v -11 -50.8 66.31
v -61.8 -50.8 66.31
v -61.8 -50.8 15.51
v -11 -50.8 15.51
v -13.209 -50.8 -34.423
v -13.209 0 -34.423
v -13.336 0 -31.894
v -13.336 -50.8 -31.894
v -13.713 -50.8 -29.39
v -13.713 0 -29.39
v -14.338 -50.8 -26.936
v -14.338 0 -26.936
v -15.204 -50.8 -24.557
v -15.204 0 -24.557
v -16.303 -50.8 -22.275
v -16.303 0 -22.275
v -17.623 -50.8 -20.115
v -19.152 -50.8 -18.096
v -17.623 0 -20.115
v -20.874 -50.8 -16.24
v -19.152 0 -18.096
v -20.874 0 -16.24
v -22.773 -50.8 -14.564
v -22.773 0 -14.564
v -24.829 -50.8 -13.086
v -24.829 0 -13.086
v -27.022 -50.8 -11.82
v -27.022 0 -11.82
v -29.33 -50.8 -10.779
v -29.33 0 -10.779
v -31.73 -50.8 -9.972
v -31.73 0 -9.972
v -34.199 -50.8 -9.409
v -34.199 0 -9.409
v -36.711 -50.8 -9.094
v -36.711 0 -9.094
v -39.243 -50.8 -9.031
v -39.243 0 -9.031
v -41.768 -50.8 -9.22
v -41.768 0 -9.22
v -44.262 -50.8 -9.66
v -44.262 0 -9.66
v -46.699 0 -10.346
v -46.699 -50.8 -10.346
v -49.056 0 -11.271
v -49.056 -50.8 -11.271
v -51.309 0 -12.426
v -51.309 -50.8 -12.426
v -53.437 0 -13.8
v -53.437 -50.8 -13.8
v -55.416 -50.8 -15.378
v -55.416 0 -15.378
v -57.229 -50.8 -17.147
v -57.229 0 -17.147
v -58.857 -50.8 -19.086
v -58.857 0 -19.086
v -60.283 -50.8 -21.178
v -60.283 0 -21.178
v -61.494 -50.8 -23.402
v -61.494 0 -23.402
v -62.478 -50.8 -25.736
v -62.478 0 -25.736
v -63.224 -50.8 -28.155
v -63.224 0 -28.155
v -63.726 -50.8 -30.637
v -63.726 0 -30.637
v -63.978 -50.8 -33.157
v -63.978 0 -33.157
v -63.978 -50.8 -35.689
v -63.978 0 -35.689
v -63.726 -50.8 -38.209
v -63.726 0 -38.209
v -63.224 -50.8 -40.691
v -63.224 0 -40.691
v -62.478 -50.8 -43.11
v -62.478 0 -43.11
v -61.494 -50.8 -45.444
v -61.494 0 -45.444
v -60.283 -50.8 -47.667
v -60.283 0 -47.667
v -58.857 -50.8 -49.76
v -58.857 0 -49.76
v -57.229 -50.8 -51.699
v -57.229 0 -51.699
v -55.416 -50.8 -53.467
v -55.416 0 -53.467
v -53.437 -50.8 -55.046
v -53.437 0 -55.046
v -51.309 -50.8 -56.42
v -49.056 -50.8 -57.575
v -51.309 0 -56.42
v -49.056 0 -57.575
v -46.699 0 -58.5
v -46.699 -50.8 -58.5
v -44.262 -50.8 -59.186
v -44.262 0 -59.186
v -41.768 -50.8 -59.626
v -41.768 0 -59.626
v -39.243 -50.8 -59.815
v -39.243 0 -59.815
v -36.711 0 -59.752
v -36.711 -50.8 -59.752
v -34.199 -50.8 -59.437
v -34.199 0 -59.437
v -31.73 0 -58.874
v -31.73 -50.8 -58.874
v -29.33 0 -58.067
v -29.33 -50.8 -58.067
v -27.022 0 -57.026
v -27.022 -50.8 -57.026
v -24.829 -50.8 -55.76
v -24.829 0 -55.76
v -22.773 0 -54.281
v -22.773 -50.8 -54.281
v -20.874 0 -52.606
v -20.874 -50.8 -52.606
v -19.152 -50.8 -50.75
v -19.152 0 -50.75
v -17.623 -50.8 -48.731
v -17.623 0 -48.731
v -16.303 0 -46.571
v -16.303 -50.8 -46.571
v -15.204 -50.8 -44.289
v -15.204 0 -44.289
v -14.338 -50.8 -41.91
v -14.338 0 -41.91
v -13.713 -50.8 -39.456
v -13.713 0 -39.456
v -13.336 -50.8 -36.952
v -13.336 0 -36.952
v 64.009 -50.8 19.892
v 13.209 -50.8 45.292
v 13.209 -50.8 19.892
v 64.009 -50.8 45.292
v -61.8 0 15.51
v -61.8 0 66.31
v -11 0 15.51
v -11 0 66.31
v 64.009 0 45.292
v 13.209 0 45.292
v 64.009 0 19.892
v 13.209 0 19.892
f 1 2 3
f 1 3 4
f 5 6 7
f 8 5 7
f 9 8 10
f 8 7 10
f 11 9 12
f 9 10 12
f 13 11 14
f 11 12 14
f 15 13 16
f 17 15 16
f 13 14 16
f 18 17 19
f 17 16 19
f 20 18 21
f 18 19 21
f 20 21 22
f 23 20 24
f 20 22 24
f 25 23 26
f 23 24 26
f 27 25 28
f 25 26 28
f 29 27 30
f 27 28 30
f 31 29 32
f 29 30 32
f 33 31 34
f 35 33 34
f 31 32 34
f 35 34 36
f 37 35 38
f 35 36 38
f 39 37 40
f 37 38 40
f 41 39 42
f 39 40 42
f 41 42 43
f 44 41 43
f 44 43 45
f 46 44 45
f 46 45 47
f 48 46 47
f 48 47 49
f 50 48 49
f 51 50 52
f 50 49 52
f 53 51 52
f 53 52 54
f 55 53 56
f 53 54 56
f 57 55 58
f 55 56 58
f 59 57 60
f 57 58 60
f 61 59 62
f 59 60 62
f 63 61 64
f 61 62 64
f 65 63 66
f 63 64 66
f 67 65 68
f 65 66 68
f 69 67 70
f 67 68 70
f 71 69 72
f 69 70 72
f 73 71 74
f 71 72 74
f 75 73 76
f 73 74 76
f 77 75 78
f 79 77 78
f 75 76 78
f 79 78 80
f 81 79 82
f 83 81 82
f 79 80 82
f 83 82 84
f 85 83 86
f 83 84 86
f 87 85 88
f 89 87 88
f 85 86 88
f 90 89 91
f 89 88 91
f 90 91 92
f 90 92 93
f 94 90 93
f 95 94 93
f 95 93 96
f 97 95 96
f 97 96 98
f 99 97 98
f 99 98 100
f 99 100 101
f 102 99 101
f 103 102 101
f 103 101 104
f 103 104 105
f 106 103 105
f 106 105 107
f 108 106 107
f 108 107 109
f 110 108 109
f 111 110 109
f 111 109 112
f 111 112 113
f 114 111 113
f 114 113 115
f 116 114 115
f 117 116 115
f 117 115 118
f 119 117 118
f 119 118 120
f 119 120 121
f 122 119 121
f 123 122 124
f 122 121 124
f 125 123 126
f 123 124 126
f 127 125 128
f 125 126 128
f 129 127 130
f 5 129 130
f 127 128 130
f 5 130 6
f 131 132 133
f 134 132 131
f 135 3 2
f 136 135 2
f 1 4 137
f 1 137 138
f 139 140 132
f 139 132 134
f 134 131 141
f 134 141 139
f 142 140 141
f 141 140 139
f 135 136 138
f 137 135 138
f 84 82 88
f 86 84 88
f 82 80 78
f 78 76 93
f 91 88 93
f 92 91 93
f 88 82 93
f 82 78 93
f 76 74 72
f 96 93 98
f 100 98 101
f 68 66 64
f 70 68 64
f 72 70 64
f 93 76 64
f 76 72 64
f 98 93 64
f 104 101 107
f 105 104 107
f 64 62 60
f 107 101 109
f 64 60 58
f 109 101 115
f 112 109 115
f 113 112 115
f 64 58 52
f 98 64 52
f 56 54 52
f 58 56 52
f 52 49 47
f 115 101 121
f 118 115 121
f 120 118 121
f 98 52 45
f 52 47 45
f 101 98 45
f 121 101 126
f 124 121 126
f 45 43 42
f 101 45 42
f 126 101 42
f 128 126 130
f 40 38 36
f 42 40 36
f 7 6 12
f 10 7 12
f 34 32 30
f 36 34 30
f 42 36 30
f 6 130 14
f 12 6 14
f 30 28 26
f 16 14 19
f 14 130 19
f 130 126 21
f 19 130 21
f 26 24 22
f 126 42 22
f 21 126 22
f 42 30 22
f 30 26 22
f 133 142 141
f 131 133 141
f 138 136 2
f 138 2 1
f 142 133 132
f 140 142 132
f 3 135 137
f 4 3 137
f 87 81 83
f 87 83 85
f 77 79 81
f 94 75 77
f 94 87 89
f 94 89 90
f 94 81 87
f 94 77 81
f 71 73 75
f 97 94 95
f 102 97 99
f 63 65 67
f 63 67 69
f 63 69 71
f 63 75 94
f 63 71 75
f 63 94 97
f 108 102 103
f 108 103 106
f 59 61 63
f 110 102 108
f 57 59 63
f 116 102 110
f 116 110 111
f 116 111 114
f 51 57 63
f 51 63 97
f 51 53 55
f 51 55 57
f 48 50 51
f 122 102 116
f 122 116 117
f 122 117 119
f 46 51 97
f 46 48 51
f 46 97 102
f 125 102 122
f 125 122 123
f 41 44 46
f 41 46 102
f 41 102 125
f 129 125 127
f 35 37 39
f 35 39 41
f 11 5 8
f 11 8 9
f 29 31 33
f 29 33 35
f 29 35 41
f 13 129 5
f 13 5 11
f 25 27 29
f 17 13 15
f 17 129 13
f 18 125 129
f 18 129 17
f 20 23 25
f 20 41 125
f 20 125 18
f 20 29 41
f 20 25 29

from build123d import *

# Parameters (mm, degrees)
F0_W     = 50.8
F0_H     = 50.8
F3_DEPTH = 50.8
F1_W     = 50.8
F1_H     = 25.4
F2_R     = 25.4
F4_DEPTH = 50.8


with BuildPart() as f3:
    # F0 (on Front) → F3 (new body)
    with BuildSketch(Plane.XZ):
        with Locations((-36.399898, 40.910499)):
            Rectangle(F0_W, F0_H)
    extrude(amount=F3_DEPTH)


with BuildPart() as f4:
    # F1 (on Front) + F2 (on Front) → F4 (new body)
    with BuildSketch(Plane.XZ):
        with Locations((38.609478, 32.592176)):
            Rectangle(F1_W, F1_H)
    with BuildSketch(Plane.XZ):
        with Locations((-38.609479, -34.422908)):
            Circle(F2_R)
    extrude(amount=F4_DEPTH)


solid = Compound([f3.part, f4.part])
